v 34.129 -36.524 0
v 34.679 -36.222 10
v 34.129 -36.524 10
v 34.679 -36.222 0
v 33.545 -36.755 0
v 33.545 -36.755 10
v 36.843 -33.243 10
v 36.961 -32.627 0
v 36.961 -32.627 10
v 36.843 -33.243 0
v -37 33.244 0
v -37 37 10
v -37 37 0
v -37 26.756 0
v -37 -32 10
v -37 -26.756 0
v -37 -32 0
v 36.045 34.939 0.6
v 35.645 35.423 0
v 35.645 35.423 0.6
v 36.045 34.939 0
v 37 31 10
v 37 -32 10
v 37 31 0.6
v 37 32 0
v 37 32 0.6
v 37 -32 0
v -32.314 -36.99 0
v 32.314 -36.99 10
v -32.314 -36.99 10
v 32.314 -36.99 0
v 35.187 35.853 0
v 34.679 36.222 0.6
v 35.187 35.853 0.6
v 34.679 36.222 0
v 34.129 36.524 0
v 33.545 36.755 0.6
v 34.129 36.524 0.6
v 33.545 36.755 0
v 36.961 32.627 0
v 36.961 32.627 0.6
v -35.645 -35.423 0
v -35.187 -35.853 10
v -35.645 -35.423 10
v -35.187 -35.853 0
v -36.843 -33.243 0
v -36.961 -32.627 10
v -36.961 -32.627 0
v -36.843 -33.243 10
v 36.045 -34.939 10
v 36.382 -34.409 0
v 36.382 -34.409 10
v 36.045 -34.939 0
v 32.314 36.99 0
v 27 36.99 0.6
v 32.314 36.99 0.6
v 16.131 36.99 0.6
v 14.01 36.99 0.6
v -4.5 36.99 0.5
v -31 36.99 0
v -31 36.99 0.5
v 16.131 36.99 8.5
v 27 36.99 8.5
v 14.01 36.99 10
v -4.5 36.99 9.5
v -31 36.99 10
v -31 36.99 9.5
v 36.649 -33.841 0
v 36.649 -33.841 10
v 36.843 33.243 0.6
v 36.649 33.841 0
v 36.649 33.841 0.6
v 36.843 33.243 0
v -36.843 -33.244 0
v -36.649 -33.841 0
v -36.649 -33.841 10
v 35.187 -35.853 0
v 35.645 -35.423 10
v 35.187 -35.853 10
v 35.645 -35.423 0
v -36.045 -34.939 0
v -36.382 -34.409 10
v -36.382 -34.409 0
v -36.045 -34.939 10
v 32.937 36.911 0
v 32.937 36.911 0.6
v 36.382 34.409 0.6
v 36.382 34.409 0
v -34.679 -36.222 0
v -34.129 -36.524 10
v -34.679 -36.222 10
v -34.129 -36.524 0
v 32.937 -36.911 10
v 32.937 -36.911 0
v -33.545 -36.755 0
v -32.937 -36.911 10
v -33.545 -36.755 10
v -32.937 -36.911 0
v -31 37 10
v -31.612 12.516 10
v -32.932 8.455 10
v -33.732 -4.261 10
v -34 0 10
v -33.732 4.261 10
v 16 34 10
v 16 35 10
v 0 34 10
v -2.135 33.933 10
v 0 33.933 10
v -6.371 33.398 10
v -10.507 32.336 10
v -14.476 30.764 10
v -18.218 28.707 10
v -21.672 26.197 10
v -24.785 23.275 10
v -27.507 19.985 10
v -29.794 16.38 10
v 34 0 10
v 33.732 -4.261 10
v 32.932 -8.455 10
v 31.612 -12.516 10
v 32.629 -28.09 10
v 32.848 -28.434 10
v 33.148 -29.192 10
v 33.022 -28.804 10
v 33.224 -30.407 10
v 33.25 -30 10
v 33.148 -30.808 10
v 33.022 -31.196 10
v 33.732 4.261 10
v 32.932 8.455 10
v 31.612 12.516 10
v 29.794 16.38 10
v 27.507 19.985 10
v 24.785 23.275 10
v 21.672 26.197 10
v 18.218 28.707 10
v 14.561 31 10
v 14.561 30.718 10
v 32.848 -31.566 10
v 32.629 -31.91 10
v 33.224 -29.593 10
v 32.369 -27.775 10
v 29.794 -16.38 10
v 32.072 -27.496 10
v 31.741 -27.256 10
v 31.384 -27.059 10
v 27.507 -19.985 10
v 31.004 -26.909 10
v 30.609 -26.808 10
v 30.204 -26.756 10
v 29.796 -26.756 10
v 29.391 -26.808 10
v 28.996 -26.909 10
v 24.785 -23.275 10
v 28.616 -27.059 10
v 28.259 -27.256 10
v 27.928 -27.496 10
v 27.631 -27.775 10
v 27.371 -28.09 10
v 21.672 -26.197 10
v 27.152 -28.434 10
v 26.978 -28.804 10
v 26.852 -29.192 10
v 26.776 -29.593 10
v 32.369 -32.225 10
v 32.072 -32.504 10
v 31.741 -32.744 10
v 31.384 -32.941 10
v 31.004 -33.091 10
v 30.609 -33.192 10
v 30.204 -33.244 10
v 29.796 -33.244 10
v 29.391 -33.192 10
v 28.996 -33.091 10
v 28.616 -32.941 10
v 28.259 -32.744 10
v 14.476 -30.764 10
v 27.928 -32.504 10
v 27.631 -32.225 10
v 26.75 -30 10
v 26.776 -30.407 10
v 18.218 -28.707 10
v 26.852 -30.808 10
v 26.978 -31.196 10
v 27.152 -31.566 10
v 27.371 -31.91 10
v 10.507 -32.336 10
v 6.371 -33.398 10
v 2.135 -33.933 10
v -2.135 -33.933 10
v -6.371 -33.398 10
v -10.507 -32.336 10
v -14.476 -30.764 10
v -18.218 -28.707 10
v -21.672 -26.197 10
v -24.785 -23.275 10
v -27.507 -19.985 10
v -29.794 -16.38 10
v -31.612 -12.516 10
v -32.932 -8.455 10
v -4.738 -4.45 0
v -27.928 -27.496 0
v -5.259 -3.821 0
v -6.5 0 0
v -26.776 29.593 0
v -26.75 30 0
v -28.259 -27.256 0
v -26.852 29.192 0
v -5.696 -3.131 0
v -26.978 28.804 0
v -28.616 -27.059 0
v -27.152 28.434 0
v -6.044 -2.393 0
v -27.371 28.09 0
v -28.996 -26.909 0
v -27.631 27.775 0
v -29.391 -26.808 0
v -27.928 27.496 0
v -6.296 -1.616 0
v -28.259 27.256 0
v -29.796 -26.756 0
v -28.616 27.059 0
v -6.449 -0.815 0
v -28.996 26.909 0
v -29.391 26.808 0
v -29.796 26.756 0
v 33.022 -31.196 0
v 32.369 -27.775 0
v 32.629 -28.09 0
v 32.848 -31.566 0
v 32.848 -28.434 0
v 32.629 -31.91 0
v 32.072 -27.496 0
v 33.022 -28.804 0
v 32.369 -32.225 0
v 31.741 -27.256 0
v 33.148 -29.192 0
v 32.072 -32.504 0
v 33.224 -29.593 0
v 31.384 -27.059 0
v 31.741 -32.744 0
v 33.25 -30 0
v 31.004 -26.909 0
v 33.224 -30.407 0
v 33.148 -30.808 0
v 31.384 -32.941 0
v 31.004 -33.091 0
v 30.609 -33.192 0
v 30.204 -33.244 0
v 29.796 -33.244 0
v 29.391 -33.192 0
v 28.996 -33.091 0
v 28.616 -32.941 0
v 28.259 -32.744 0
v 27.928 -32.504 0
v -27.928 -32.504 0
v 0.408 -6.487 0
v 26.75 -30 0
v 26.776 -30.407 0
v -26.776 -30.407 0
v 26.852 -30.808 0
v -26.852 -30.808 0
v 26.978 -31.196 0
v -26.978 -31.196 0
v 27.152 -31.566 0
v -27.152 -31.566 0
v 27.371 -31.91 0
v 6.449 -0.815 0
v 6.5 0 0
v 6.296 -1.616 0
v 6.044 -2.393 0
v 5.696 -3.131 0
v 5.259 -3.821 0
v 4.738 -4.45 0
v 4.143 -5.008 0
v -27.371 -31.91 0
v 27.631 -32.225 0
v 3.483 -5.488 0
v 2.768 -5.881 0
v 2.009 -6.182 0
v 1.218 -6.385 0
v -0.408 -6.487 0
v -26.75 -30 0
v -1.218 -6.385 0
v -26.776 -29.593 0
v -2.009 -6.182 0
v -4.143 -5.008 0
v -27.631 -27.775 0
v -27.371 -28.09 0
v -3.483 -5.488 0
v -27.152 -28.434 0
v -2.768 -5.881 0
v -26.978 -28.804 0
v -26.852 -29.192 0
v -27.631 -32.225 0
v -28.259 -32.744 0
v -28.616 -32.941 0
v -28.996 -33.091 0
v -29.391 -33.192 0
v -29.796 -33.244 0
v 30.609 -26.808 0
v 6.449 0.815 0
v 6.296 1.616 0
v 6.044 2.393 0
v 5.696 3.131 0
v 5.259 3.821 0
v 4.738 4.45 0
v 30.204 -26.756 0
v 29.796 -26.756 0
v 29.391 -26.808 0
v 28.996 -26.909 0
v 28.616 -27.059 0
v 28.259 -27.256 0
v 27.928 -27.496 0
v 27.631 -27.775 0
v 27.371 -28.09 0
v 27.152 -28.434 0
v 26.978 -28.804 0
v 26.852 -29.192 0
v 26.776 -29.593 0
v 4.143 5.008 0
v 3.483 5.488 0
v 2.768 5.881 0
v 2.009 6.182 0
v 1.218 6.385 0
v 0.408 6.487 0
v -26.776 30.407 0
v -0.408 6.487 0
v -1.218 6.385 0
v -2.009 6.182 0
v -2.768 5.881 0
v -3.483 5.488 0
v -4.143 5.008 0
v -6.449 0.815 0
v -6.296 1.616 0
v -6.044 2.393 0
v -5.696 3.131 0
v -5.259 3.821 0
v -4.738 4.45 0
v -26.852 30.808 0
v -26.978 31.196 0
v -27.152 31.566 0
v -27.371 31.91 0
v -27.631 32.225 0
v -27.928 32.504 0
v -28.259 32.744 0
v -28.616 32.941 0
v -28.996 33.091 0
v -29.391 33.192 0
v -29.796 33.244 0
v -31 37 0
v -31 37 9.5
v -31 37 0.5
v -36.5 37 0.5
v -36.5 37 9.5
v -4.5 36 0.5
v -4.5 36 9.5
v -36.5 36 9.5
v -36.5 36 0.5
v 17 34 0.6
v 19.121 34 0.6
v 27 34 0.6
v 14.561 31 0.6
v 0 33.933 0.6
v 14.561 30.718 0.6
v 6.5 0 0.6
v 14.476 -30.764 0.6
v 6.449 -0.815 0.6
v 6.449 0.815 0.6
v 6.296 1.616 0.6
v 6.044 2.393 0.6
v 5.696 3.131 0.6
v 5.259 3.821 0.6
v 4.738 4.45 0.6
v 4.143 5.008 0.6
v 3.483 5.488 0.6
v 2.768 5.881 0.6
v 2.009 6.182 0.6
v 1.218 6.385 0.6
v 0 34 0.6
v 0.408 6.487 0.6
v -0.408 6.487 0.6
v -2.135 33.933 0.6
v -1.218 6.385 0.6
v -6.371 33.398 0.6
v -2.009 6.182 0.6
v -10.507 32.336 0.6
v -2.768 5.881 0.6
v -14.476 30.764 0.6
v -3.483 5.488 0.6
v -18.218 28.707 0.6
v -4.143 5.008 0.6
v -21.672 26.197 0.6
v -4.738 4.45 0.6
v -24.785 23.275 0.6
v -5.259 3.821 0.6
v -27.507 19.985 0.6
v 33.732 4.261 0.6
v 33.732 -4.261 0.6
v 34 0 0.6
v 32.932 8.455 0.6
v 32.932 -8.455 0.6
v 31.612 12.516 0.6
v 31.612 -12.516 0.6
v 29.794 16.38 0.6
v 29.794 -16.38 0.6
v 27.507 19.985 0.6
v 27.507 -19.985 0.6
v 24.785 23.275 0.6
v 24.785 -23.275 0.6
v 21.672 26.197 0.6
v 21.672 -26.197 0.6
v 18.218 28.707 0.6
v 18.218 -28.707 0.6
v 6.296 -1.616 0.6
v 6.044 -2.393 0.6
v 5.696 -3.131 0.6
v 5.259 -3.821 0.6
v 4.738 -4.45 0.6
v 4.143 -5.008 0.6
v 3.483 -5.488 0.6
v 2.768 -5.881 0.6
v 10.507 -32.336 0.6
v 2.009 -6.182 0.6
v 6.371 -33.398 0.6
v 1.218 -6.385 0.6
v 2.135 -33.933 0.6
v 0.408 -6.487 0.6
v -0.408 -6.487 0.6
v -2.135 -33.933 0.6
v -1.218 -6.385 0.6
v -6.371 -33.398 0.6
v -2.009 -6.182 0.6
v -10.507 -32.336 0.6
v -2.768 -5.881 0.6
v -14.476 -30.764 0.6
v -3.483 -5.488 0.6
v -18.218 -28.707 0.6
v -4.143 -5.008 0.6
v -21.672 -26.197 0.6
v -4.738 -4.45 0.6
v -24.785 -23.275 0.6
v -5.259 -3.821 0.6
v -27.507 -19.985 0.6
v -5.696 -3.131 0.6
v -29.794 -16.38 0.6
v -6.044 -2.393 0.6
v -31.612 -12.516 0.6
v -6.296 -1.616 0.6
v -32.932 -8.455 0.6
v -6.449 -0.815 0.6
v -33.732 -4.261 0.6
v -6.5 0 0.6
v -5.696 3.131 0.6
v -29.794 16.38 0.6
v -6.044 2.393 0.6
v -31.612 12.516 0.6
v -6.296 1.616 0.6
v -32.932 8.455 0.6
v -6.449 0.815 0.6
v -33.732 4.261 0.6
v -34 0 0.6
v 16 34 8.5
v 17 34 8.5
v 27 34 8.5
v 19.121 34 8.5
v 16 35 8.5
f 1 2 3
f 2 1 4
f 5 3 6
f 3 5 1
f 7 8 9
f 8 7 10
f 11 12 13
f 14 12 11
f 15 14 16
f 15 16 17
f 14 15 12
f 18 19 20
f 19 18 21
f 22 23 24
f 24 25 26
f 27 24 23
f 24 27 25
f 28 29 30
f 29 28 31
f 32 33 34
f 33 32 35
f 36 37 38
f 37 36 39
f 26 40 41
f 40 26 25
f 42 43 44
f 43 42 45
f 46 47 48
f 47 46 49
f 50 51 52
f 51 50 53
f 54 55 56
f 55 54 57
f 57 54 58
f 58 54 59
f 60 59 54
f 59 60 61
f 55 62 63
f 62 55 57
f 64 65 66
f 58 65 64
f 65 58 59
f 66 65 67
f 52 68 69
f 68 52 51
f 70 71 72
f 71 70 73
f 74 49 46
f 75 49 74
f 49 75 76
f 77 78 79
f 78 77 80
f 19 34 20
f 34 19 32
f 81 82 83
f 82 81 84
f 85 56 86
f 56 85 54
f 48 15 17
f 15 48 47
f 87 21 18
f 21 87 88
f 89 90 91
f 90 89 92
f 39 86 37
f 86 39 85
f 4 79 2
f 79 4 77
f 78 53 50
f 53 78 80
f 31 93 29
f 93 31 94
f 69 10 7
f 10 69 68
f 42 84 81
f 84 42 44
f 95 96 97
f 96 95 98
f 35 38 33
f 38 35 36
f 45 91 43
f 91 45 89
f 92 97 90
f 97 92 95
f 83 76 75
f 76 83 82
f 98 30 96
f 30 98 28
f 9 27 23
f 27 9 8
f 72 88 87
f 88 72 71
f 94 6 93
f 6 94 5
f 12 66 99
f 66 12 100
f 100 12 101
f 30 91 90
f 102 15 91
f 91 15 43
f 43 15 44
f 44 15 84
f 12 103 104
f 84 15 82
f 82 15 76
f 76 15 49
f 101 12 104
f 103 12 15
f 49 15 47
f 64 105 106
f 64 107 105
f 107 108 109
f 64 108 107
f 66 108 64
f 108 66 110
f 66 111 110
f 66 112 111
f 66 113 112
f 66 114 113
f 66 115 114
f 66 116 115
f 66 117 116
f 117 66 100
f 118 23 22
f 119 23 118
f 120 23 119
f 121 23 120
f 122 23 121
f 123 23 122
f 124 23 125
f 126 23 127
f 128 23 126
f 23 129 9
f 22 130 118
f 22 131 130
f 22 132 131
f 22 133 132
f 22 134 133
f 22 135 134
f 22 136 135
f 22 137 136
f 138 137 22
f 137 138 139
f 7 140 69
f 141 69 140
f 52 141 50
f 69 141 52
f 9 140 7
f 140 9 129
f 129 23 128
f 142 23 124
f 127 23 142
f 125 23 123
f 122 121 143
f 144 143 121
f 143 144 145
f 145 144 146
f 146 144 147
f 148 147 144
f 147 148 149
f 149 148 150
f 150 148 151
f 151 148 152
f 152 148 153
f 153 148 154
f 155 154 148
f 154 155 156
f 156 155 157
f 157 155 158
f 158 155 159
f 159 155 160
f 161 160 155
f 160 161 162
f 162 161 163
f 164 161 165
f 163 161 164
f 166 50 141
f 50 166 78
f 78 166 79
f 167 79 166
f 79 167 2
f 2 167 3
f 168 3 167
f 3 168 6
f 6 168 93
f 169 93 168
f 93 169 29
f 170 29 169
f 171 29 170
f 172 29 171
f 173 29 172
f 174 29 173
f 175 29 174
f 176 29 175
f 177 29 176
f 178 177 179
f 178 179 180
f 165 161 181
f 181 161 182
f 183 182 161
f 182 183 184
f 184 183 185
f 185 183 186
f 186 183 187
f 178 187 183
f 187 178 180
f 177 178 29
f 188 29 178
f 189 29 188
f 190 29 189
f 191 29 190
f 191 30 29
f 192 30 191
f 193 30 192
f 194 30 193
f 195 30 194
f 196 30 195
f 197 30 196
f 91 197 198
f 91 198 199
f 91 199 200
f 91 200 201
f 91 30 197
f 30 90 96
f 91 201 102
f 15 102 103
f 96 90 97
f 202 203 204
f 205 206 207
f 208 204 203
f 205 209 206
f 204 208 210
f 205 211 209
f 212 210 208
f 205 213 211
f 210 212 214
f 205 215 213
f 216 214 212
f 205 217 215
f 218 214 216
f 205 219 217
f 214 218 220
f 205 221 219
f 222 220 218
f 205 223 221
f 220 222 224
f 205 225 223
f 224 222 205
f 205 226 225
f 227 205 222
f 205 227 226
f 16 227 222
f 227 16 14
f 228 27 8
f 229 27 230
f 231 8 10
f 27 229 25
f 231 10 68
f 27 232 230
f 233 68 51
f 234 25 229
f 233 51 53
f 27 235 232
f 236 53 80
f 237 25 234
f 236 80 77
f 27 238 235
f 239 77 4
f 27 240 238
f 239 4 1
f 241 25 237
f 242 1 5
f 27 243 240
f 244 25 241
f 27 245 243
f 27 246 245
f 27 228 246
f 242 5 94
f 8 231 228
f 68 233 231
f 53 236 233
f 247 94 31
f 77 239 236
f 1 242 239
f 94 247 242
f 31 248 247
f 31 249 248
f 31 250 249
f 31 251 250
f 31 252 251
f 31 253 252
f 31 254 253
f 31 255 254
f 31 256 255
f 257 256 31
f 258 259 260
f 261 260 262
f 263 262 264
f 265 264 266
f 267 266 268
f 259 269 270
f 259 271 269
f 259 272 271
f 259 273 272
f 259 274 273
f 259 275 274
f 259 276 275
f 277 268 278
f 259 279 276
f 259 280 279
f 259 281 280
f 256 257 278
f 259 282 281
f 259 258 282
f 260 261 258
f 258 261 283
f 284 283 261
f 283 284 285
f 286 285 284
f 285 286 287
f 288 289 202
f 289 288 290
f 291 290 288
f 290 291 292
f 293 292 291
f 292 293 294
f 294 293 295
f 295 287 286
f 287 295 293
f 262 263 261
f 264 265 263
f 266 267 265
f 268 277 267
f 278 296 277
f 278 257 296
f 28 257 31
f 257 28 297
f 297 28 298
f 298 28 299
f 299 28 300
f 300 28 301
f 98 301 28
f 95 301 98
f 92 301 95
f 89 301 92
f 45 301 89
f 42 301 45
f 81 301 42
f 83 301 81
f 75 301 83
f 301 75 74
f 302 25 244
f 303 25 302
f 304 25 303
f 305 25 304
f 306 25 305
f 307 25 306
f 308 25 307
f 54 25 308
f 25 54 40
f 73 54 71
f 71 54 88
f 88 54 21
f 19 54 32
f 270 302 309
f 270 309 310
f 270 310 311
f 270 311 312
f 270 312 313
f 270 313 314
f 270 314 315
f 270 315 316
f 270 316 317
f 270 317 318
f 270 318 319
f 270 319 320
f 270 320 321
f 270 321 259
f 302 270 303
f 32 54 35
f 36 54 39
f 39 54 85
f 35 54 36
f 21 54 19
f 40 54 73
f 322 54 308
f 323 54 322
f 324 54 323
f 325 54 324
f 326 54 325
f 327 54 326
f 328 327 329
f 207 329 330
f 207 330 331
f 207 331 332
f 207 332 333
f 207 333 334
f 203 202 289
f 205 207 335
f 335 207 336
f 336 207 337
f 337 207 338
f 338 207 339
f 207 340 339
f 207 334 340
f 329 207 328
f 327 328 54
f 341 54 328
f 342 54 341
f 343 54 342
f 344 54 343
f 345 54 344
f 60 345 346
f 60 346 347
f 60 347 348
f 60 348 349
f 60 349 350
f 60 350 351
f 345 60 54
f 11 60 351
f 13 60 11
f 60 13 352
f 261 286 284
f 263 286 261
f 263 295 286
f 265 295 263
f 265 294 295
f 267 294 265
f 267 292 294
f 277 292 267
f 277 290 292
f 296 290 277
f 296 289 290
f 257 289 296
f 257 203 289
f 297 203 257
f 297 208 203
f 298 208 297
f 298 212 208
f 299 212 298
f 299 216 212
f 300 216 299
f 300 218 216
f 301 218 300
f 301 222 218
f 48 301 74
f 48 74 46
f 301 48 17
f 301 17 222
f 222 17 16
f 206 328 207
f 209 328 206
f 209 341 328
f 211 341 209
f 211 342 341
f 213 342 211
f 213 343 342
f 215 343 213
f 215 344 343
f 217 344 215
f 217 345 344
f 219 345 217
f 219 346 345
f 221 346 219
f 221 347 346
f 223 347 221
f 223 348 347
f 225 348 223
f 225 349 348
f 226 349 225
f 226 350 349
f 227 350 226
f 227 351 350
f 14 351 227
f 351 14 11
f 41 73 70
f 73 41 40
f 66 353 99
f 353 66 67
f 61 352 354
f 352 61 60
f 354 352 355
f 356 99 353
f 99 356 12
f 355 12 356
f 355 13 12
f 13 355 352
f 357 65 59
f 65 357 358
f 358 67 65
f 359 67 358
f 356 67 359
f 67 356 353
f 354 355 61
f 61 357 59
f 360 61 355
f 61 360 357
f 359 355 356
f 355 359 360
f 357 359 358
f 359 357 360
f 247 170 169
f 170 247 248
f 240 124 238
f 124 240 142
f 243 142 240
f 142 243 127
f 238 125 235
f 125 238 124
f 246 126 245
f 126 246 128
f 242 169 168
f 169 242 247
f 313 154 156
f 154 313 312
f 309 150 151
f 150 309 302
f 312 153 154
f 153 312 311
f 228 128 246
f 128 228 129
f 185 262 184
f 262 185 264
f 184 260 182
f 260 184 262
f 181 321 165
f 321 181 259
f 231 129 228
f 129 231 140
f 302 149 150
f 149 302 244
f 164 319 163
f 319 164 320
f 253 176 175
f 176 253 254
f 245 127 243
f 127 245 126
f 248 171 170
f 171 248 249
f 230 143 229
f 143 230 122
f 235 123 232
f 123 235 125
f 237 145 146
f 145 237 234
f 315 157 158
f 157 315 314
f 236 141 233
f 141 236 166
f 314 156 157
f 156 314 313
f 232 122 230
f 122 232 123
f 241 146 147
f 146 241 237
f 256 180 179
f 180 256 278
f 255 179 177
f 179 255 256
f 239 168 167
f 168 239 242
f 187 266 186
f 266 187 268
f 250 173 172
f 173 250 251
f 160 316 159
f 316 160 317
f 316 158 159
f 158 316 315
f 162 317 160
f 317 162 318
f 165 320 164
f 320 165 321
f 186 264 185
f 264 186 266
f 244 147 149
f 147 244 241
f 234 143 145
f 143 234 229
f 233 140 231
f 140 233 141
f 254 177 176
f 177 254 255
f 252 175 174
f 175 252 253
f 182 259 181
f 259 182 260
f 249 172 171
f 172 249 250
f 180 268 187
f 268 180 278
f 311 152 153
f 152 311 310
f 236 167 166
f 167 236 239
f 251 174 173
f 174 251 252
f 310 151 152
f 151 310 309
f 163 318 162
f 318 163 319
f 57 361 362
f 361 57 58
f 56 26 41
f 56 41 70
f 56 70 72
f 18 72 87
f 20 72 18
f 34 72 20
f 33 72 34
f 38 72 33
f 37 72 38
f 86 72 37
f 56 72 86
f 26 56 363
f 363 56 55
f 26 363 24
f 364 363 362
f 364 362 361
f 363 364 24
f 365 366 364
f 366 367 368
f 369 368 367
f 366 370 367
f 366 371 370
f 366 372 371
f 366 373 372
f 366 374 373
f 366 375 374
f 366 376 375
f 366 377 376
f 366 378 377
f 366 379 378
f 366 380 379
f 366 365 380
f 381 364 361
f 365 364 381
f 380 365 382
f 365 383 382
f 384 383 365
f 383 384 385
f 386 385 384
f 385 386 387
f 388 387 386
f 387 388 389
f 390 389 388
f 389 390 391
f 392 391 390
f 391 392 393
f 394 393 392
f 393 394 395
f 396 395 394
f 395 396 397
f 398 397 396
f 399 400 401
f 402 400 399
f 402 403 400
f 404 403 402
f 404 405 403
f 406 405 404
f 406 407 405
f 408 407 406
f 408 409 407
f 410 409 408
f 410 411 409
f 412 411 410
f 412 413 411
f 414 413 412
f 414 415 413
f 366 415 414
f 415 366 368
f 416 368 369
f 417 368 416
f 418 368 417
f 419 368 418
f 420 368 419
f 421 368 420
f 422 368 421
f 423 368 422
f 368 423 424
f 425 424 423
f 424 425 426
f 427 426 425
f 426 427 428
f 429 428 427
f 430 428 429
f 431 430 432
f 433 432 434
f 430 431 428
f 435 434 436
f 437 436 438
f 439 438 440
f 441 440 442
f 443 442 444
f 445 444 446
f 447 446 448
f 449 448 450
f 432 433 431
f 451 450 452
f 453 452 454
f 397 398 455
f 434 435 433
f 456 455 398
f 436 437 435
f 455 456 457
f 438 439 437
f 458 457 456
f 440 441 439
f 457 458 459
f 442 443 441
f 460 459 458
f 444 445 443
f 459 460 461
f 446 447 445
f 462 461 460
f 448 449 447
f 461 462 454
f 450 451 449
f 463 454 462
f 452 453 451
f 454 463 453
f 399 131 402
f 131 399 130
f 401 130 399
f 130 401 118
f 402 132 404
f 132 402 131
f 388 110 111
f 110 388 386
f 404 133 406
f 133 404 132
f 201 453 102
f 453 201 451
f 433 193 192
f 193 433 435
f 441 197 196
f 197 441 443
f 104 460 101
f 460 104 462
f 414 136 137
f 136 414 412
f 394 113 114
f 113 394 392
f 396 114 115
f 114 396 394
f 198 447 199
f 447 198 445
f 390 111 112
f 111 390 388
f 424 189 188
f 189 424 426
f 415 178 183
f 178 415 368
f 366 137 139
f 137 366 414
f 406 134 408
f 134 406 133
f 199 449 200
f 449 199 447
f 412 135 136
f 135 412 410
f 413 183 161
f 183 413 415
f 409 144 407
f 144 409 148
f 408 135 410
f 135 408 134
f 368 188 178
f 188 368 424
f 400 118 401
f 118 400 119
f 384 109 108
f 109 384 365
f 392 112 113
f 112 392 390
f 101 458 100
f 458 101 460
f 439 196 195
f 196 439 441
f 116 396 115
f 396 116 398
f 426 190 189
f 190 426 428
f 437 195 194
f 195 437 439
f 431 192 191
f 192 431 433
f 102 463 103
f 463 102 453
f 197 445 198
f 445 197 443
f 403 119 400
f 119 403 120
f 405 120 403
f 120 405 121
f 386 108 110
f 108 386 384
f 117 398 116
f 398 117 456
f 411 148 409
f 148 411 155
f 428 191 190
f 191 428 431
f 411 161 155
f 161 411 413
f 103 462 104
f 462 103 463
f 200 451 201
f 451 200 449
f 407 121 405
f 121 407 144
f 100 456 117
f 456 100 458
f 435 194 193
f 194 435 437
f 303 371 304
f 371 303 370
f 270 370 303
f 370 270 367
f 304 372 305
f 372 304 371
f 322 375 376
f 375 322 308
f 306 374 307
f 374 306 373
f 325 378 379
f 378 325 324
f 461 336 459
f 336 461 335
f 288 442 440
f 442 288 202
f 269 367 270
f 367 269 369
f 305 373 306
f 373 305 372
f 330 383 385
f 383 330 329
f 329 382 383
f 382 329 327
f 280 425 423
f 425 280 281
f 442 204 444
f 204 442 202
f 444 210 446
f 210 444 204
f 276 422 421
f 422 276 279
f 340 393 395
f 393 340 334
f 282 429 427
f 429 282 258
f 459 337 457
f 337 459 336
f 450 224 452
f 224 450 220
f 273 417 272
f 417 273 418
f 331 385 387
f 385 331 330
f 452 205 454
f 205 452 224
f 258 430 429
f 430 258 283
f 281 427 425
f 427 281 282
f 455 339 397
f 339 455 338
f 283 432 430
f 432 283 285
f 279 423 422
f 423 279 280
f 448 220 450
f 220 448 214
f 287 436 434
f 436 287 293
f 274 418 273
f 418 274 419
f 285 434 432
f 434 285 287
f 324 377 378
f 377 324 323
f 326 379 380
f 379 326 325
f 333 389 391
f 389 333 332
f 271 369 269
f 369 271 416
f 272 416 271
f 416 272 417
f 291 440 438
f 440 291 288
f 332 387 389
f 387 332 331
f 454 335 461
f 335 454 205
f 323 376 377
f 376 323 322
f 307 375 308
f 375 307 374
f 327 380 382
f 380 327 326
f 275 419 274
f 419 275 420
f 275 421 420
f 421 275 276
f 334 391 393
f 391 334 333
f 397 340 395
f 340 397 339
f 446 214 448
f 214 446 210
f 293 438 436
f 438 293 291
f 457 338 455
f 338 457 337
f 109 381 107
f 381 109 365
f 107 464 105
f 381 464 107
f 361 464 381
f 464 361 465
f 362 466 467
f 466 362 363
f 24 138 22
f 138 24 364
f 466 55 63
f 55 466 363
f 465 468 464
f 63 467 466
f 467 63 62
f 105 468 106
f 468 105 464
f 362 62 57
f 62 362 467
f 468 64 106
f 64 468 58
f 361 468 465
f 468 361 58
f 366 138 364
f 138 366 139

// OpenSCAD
$fn = 50;


difference() {
	union() {
		hull() {
			translate(v = [-32.0000000000, 32.0000000000, 0]) {
				cylinder(h = 10, r = 5);
			}
			translate(v = [32.0000000000, 32.0000000000, 0]) {
				cylinder(h = 10, r = 5);
			}
			translate(v = [-32.0000000000, -32.0000000000, 0]) {
				cylinder(h = 10, r = 5);
			}
			translate(v = [32.0000000000, -32.0000000000, 0]) {
				cylinder(h = 10, r = 5);
			}
		}
		translate(v = [-37.0000000000, 31.0000000000, 0]) {
			cube(size = [6, 6, 10]);
		}
	}
	union() {
		translate(v = [-37.5000000000, -30.0000000000, -250.0000000000]) {
			rotate(a = [0, 0, 0]) {
				difference() {
					union() {
						hull() {
							translate(v = [7.5000000000, 0, 0]) {
								cylinder(h = 250, r = 3.2500000000, r1 = 3.2500000000, r2 = 3.2500000000);
							}
							translate(v = [-7.5000000000, 0, 0]) {
								cylinder(h = 250, r = 3.2500000000, r1 = 3.2500000000, r2 = 3.2500000000);
							}
						}
					}
					union();
				}
			}
		}
		translate(v = [-37.5000000000, 30.0000000000, -250.0000000000]) {
			rotate(a = [0, 0, 0]) {
				difference() {
					union() {
						hull() {
							translate(v = [7.5000000000, 0, 0]) {
								cylinder(h = 250, r = 3.2500000000, r1 = 3.2500000000, r2 = 3.2500000000);
							}
							translate(v = [-7.5000000000, 0, 0]) {
								cylinder(h = 250, r = 3.2500000000, r1 = 3.2500000000, r2 = 3.2500000000);
							}
						}
					}
					union();
				}
			}
		}
		translate(v = [-36.5000000000, 36.0000000000, 0.5000000000]) {
			cube(size = [32, 1, 9.0000000000]);
		}
		translate(v = [30.0000000000, -30.0000000000, -50.0000000000]) {
			cylinder(h = 100, r = 3.2500000000);
		}
		translate(v = [0, 0, 0.6000000000]) {
			cylinder(h = 12.4000000000, r = 34.0000000000);
		}
		translate(v = [0, 0, -5.0000000000]) {
			cylinder(h = 10, r = 6.5000000000);
		}
		translate(v = [0.0000000000, 31.0000000000, 0.6000000000]) {
			cube(size = [37.0000000000, 3, 12.4000000000]);
		}
		translate(v = [27.0000000000, 31.0000000000, 0.6000000000]) {
			cube(size = [10, 6, 12.4000000000]);
		}
		translate(v = [16.0000000000, 31.0000000000, 8.5000000000]) {
			cube(size = [21, 6, 1.5000000000]);
		}
		translate(v = [13.2500000000, 37.7500000000, 0.6000000000]) {
			rotate(a = [0, 0, -45]) {
				cube(size = [7.5000000000, 1.5000000000, 12.4000000000]);
			}
		}
		translate(v = [7.0610000000, 29.0000000000, 0.6000000000]) {
			cube(size = [7.5000000000, 2, 9.4000000000]);
		}
	}
}
